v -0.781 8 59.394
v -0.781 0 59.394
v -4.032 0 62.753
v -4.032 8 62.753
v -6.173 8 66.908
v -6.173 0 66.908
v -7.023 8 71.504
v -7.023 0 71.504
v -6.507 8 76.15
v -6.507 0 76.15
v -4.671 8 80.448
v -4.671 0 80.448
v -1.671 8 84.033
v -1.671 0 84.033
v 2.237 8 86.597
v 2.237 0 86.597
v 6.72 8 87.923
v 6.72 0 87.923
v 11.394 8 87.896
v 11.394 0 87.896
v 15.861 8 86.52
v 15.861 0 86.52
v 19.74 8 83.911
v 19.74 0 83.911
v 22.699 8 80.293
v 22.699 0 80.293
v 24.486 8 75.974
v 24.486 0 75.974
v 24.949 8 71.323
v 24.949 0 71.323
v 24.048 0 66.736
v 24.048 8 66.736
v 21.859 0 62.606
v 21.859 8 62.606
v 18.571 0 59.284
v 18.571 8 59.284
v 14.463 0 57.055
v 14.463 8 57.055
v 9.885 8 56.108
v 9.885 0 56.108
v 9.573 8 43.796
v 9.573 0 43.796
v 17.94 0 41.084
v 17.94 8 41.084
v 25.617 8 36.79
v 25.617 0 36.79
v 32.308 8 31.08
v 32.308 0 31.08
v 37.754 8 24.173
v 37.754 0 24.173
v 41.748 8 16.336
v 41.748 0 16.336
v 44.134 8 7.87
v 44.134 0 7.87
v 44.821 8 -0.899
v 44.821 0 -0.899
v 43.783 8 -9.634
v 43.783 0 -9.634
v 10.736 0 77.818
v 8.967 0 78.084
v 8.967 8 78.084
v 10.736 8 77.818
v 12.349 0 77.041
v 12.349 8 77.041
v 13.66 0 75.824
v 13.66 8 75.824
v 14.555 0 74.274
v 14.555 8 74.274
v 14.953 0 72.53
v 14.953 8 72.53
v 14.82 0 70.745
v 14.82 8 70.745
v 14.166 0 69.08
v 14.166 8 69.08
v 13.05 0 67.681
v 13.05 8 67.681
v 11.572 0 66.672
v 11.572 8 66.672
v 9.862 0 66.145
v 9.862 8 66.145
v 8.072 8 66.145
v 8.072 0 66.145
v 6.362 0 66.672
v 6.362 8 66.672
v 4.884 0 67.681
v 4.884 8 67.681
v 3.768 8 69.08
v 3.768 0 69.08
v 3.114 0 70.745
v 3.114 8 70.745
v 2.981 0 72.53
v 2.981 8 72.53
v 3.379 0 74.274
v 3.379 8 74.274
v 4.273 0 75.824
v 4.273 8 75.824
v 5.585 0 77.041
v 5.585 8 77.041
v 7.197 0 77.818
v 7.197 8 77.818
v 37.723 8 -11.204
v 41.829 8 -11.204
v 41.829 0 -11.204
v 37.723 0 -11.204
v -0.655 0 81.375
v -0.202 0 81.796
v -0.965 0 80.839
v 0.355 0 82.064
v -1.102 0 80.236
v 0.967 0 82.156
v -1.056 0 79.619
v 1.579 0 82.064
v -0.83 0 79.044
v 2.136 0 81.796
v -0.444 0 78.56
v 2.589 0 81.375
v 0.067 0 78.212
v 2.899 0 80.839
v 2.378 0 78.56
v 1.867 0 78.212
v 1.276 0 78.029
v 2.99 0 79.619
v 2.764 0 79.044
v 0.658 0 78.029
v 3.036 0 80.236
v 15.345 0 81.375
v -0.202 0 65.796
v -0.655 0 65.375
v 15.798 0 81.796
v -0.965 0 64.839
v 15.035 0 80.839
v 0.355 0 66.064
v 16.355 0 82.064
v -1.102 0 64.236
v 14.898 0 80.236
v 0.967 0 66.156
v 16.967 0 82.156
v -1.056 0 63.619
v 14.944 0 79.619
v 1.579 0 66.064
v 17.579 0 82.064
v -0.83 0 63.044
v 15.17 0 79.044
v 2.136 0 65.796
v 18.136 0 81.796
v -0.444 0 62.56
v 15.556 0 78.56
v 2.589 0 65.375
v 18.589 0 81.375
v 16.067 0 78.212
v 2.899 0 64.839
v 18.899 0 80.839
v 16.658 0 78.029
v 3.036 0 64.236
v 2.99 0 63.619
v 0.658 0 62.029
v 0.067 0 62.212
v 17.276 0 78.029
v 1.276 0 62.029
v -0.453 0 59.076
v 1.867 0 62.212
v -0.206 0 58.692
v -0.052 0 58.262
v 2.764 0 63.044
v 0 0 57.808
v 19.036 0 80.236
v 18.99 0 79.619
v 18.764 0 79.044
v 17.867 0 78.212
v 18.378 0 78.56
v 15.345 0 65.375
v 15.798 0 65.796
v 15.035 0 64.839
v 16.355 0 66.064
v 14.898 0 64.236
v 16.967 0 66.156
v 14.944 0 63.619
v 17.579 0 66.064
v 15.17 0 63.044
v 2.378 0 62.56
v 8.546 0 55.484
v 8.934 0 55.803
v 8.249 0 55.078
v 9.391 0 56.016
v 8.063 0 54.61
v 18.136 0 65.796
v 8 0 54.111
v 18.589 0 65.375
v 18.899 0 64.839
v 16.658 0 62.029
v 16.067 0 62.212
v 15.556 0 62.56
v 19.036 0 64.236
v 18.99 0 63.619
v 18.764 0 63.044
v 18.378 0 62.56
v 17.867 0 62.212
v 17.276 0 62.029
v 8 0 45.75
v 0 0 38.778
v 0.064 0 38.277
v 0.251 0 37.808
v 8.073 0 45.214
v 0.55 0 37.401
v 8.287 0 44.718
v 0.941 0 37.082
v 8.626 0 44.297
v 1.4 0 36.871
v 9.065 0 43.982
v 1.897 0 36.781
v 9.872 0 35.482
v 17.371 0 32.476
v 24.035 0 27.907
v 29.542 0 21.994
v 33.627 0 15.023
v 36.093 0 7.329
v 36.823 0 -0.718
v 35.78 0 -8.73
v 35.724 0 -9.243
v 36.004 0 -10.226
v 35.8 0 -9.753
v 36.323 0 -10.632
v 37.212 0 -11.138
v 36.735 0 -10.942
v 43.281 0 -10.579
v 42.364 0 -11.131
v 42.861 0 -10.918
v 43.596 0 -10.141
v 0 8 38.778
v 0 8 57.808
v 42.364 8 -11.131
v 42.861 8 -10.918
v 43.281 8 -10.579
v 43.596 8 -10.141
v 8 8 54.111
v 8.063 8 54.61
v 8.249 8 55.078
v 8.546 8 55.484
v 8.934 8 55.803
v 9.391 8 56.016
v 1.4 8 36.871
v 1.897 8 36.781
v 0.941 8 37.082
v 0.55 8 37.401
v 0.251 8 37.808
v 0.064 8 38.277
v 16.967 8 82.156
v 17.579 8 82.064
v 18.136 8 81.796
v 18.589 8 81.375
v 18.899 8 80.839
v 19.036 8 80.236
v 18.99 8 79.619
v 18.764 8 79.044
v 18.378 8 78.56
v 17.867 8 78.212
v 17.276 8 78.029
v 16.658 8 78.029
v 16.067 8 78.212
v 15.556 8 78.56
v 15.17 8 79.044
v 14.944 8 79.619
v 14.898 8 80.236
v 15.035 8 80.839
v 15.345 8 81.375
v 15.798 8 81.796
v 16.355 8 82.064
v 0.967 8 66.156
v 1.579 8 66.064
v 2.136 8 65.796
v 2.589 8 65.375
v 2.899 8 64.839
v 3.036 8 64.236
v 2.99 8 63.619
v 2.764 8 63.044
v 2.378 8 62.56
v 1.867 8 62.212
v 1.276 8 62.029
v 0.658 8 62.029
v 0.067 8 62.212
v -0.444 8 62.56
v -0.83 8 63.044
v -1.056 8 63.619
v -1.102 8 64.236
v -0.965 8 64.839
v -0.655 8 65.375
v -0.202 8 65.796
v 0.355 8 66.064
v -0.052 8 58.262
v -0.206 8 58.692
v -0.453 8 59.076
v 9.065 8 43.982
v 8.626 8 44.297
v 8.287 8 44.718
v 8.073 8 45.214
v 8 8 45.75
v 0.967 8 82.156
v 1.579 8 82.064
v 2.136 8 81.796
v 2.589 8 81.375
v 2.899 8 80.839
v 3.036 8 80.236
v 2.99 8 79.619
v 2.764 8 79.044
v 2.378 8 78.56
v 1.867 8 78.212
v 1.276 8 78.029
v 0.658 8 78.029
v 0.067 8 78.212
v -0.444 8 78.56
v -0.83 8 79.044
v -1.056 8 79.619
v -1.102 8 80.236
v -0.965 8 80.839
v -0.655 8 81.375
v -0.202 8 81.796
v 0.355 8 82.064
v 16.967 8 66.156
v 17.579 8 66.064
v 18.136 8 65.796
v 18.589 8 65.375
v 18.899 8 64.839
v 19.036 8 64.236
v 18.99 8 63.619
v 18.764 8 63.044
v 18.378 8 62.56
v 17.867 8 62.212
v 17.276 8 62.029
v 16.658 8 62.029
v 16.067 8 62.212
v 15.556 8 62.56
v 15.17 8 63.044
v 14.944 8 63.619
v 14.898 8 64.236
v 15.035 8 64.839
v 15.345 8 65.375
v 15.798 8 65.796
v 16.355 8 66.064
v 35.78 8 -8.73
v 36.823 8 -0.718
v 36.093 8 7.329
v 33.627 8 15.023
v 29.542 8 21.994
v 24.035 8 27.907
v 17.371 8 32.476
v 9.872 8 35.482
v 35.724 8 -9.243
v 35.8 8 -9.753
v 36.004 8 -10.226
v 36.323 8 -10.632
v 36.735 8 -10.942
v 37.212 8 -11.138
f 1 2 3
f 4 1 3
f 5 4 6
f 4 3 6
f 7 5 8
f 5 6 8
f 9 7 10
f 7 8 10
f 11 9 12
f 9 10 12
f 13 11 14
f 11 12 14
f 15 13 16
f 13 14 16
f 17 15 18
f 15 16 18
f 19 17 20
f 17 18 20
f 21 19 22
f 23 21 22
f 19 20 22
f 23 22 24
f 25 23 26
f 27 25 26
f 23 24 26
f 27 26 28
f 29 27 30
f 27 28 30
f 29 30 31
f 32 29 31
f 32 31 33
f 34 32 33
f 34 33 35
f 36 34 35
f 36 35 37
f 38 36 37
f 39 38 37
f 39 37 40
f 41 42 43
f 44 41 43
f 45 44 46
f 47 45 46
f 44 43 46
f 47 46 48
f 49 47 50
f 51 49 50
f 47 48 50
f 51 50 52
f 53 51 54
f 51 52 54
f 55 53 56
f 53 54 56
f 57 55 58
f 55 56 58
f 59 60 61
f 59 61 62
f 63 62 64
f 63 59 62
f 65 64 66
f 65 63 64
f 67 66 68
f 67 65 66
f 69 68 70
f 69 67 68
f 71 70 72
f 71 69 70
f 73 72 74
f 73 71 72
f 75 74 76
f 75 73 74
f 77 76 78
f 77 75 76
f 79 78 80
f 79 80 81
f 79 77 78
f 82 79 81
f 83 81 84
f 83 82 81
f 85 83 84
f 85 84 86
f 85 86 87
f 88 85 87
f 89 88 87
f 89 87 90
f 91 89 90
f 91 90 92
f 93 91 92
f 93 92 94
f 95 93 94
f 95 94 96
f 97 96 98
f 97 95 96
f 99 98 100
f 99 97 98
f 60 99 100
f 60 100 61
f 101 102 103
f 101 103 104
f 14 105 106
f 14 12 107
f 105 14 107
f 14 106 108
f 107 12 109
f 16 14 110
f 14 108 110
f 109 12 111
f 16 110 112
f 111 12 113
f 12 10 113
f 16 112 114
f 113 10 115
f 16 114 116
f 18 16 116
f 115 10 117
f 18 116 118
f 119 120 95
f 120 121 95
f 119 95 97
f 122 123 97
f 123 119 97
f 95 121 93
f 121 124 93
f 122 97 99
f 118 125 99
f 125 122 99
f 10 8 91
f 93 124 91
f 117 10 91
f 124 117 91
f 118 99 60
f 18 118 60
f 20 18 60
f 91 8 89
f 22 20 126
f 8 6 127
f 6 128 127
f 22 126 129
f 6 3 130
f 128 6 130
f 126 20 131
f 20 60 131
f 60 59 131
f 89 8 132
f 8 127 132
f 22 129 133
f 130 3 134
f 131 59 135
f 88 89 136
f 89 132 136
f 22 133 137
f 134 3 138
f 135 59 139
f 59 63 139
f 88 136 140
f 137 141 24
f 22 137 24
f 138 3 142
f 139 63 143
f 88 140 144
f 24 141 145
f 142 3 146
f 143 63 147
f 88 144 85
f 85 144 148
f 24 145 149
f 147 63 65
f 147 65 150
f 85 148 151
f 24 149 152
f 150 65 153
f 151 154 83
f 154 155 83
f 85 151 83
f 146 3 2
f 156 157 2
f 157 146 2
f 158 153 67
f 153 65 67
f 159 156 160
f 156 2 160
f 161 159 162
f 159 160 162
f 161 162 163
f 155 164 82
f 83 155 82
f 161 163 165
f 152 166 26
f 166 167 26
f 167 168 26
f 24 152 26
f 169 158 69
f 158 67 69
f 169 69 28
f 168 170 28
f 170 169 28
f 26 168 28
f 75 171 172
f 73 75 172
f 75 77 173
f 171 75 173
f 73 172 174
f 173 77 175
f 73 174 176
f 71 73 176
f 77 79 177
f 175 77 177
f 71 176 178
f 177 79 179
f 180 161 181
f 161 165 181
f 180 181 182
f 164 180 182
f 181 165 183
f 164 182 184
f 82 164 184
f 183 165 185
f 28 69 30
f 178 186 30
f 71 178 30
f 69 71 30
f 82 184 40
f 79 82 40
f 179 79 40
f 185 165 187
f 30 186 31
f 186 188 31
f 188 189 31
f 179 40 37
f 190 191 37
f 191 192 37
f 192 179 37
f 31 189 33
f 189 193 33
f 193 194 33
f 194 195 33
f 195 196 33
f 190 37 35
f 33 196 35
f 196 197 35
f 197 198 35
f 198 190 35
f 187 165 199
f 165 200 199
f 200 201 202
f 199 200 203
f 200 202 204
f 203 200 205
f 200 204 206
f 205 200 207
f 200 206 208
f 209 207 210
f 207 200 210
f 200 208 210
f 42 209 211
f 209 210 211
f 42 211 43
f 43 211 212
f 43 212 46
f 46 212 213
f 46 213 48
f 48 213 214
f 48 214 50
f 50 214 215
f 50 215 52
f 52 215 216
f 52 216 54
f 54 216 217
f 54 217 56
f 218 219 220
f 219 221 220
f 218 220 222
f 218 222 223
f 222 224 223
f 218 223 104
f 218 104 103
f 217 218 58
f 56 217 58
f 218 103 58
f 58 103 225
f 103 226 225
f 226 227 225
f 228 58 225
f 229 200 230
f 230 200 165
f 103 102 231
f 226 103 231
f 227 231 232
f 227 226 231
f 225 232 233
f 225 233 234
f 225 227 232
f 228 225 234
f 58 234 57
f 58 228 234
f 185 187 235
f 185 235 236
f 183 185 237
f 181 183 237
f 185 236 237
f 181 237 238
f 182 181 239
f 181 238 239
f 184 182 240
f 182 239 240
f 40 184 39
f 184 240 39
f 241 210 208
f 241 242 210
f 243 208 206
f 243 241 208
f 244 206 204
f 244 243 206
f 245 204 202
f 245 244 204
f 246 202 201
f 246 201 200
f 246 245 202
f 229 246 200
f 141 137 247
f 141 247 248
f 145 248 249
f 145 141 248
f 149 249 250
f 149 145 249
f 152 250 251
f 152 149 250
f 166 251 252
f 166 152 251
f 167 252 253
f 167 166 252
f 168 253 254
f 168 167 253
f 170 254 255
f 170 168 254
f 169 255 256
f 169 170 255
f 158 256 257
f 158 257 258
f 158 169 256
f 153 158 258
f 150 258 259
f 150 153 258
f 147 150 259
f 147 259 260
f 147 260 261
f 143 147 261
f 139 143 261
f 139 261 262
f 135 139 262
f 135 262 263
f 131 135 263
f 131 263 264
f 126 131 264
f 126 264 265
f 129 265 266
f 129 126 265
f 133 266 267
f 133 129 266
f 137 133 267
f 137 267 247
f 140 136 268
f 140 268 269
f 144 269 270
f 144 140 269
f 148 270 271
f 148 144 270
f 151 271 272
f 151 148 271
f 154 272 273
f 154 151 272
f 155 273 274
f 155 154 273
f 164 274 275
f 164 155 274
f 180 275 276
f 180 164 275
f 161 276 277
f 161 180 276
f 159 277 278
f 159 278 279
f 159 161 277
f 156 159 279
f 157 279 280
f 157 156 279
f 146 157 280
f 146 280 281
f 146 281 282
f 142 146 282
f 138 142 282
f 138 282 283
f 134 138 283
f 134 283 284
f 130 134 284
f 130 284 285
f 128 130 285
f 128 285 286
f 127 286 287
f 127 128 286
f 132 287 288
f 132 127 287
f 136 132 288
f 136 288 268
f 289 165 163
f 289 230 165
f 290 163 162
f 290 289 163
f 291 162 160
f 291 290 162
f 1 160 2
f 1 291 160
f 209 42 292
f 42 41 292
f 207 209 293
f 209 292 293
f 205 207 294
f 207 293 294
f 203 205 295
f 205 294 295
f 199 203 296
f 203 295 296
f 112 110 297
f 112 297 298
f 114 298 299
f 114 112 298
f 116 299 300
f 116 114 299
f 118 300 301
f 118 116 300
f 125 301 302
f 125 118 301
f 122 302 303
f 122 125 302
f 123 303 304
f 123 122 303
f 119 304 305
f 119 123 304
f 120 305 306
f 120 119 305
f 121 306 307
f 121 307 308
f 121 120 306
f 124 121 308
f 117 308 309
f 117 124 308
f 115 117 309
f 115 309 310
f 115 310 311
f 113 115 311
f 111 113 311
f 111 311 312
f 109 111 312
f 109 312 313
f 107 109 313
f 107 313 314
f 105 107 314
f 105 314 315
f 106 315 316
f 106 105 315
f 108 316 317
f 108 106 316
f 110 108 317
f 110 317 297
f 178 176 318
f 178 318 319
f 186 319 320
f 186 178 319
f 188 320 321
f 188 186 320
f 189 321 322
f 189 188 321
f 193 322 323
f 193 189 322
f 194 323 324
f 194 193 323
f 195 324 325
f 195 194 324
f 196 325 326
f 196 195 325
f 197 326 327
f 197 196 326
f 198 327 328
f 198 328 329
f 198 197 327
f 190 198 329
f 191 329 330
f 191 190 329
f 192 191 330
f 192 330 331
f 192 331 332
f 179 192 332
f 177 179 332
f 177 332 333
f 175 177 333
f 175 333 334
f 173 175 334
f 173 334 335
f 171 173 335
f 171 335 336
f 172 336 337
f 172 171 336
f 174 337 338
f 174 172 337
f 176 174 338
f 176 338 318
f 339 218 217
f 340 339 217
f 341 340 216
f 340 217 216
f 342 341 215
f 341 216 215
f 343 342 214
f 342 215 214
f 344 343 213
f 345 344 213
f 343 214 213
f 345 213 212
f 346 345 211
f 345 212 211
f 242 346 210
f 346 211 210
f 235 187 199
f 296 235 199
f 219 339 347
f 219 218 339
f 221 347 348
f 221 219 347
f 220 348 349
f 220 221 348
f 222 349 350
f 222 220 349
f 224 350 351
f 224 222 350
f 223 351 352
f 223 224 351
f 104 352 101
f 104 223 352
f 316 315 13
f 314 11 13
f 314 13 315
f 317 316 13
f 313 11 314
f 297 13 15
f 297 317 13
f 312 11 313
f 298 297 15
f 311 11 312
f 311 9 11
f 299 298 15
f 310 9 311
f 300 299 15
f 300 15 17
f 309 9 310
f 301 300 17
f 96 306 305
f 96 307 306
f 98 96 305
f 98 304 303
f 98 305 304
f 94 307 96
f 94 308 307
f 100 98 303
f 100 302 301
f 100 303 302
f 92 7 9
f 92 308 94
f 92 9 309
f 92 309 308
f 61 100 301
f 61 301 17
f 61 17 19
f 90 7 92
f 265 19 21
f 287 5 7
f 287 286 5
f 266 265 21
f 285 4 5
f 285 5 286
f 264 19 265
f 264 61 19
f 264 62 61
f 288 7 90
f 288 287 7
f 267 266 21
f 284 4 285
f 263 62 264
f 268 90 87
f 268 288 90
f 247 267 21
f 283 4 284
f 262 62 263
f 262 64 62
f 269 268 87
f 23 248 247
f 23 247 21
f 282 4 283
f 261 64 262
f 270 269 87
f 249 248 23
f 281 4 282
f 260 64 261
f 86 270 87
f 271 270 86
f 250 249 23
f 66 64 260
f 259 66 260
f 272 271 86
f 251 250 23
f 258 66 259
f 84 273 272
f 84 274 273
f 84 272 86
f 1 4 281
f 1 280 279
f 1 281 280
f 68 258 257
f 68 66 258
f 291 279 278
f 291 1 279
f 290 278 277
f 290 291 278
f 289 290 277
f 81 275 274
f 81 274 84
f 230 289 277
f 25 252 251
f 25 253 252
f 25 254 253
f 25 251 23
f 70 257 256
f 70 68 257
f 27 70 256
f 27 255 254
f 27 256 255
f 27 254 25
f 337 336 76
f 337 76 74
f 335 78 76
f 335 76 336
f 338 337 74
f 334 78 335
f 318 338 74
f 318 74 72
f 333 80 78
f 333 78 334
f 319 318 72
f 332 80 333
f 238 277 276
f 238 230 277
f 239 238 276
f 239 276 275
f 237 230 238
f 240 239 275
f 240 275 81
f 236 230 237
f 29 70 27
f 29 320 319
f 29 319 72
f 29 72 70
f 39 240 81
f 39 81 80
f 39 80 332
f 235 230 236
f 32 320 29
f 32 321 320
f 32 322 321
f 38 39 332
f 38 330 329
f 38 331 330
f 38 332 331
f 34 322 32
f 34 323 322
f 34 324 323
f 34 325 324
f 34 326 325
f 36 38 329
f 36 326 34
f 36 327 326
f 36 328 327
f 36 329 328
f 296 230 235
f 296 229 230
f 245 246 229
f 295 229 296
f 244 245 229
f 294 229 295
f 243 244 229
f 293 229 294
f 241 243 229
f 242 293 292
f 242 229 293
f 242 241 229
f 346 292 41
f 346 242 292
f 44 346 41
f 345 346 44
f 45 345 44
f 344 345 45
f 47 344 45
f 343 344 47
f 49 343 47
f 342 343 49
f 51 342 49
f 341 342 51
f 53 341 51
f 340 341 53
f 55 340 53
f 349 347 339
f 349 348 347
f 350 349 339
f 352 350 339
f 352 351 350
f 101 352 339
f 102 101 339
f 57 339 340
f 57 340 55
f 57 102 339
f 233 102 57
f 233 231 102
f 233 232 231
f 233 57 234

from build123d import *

# Parameters (mm, degrees)
SKETCH1_R           = 2.075
SKETCH1_R_2         = 6.003208263
BOSS_EXTRUDE2_DEPTH = 8
FILLET1_R           = 2
CUT_EXTRUDE1_DEPTH  = 10
FILLET2_R           = 2
CUT_EXTRUDE2_DEPTH  = 10
FILLET3_R           = 2


with BuildPart() as part:
    # Sketch1 → Boss-Extrude2 (new body)
    with BuildSketch(Plane(origin=(0, 0, 0), x_dir=(1, 0, 0), z_dir=(0, 1, 0))):
        with BuildLine():
            Line((0, 44.83), (0, 36.83))
            ThreePointArc((0, 36.83), (36.83, 0), (0, -36.83))
            Line((0, -36.83), (0, -46.83))
            Line((0, -46.83), (0, -58.83))
            ThreePointArc((0, -58.83), (14.116701064, -87.229775601), (8, -56.110417137))
            Line((8, -56.110417137), (8, -44.110417137))
            ThreePointArc((8, -44.110417137), (44.649741882, 4.016148637), (0, 44.83))
        make_face()
        with Locations(Location((0.96696537, -64.081170969, 0), (0, 0, 270))):
            Circle(SKETCH1_R, mode=Mode.SUBTRACT)
        with Locations(Location((16.96696537, -64.081170969, 0), (0, 0, 270))):
            Circle(SKETCH1_R, mode=Mode.SUBTRACT)
        with Locations(Location((16.96696537, -80.081170969, 0), (0, 0, 270))):
            Circle(SKETCH1_R, mode=Mode.SUBTRACT)
        with Locations(Location((0.96696537, -80.081170969, 0), (0, 0, 270))):
            Circle(SKETCH1_R, mode=Mode.SUBTRACT)
        with Locations(Location((8.96696537, -72.081170969, 0), (0, 0, 270))):
            Circle(SKETCH1_R_2, mode=Mode.SUBTRACT)
    extrude(amount=BOSS_EXTRUDE2_DEPTH)

    # Fillet1
    fillet1_edges = [part.edges().sort_by_distance(p)[0] for p in [
        (0, 4, 58.83),
        (0, 4, 36.83),
        (0, 4, -36.83),
        (0, 4, -44.83),
        (8, 4, 44.110417137),
        (8, 4, 56.110417137),
    ]]
    fillet(fillet1_edges, radius=FILLET1_R)

    # Sketch2 → Cut-Extrude1 (cut)
    with BuildSketch(Plane(origin=(0, 8, 0), x_dir=(1, 0, 0), z_dir=(0, 1, 0))):
        with BuildLine():
            Line((41.799027506, 16.204018007), (33.073837099, 16.204018007))
            ThreePointArc((33.073837099, 16.204018007), (20.287775905, 30.738494576), (1.896986866, 36.781113915))
            ThreePointArc((1.896986866, 36.781113915), (0.549823068, 37.401147764), (0, 38.778459227))
            Line((0, 38.778459227), (0, 42.783278276))
            Line((0, 42.783278276), (0, 44.783278276))
            Line((0, 44.783278276), (-0.257809332, 46.655742188))
            Line((-0.257809332, 46.655742188), (2.752058537, 46.655742188))
            Line((2.752058537, 46.655742188), (2.752058537, 44.782949944))
            ThreePointArc((2.752058537, 44.782949944), (26.871190964, 36.772449298), (41.799027506, 16.204018007))
        make_face()
    extrude(amount=-CUT_EXTRUDE1_DEPTH, mode=Mode.SUBTRACT)

    # Fillet2
    fillet2_edges = [part.edges().sort_by_distance(p)[0] for p in [
        (41.799027506, 4, -16.204018007),
        (33.073837099, 4, -16.204018007),
    ]]
    fillet(fillet2_edges, radius=FILLET2_R)

    # Sketch3 → Cut-Extrude2 (cut)
    with BuildSketch(Plane(origin=(0, 8, 0), x_dir=(1, 0, 0), z_dir=(0, 1, 0))):
        Polygon((34.701551804, 11.204018007), (33.222316064, 16.570796176), (43.892135876, 17.266509565), (44.733726157, 11.204018007), align=None)
    extrude(amount=-CUT_EXTRUDE2_DEPTH, mode=Mode.SUBTRACT)

    # Fillet3
    fillet3_edges = [part.edges().sort_by_distance(p)[0] for p in [
        (43.40735975, 4, -11.204018007),
        (35.084453544, 4, -11.204018007),
    ]]
    fillet(fillet3_edges, radius=FILLET3_R)


solid = part.part
